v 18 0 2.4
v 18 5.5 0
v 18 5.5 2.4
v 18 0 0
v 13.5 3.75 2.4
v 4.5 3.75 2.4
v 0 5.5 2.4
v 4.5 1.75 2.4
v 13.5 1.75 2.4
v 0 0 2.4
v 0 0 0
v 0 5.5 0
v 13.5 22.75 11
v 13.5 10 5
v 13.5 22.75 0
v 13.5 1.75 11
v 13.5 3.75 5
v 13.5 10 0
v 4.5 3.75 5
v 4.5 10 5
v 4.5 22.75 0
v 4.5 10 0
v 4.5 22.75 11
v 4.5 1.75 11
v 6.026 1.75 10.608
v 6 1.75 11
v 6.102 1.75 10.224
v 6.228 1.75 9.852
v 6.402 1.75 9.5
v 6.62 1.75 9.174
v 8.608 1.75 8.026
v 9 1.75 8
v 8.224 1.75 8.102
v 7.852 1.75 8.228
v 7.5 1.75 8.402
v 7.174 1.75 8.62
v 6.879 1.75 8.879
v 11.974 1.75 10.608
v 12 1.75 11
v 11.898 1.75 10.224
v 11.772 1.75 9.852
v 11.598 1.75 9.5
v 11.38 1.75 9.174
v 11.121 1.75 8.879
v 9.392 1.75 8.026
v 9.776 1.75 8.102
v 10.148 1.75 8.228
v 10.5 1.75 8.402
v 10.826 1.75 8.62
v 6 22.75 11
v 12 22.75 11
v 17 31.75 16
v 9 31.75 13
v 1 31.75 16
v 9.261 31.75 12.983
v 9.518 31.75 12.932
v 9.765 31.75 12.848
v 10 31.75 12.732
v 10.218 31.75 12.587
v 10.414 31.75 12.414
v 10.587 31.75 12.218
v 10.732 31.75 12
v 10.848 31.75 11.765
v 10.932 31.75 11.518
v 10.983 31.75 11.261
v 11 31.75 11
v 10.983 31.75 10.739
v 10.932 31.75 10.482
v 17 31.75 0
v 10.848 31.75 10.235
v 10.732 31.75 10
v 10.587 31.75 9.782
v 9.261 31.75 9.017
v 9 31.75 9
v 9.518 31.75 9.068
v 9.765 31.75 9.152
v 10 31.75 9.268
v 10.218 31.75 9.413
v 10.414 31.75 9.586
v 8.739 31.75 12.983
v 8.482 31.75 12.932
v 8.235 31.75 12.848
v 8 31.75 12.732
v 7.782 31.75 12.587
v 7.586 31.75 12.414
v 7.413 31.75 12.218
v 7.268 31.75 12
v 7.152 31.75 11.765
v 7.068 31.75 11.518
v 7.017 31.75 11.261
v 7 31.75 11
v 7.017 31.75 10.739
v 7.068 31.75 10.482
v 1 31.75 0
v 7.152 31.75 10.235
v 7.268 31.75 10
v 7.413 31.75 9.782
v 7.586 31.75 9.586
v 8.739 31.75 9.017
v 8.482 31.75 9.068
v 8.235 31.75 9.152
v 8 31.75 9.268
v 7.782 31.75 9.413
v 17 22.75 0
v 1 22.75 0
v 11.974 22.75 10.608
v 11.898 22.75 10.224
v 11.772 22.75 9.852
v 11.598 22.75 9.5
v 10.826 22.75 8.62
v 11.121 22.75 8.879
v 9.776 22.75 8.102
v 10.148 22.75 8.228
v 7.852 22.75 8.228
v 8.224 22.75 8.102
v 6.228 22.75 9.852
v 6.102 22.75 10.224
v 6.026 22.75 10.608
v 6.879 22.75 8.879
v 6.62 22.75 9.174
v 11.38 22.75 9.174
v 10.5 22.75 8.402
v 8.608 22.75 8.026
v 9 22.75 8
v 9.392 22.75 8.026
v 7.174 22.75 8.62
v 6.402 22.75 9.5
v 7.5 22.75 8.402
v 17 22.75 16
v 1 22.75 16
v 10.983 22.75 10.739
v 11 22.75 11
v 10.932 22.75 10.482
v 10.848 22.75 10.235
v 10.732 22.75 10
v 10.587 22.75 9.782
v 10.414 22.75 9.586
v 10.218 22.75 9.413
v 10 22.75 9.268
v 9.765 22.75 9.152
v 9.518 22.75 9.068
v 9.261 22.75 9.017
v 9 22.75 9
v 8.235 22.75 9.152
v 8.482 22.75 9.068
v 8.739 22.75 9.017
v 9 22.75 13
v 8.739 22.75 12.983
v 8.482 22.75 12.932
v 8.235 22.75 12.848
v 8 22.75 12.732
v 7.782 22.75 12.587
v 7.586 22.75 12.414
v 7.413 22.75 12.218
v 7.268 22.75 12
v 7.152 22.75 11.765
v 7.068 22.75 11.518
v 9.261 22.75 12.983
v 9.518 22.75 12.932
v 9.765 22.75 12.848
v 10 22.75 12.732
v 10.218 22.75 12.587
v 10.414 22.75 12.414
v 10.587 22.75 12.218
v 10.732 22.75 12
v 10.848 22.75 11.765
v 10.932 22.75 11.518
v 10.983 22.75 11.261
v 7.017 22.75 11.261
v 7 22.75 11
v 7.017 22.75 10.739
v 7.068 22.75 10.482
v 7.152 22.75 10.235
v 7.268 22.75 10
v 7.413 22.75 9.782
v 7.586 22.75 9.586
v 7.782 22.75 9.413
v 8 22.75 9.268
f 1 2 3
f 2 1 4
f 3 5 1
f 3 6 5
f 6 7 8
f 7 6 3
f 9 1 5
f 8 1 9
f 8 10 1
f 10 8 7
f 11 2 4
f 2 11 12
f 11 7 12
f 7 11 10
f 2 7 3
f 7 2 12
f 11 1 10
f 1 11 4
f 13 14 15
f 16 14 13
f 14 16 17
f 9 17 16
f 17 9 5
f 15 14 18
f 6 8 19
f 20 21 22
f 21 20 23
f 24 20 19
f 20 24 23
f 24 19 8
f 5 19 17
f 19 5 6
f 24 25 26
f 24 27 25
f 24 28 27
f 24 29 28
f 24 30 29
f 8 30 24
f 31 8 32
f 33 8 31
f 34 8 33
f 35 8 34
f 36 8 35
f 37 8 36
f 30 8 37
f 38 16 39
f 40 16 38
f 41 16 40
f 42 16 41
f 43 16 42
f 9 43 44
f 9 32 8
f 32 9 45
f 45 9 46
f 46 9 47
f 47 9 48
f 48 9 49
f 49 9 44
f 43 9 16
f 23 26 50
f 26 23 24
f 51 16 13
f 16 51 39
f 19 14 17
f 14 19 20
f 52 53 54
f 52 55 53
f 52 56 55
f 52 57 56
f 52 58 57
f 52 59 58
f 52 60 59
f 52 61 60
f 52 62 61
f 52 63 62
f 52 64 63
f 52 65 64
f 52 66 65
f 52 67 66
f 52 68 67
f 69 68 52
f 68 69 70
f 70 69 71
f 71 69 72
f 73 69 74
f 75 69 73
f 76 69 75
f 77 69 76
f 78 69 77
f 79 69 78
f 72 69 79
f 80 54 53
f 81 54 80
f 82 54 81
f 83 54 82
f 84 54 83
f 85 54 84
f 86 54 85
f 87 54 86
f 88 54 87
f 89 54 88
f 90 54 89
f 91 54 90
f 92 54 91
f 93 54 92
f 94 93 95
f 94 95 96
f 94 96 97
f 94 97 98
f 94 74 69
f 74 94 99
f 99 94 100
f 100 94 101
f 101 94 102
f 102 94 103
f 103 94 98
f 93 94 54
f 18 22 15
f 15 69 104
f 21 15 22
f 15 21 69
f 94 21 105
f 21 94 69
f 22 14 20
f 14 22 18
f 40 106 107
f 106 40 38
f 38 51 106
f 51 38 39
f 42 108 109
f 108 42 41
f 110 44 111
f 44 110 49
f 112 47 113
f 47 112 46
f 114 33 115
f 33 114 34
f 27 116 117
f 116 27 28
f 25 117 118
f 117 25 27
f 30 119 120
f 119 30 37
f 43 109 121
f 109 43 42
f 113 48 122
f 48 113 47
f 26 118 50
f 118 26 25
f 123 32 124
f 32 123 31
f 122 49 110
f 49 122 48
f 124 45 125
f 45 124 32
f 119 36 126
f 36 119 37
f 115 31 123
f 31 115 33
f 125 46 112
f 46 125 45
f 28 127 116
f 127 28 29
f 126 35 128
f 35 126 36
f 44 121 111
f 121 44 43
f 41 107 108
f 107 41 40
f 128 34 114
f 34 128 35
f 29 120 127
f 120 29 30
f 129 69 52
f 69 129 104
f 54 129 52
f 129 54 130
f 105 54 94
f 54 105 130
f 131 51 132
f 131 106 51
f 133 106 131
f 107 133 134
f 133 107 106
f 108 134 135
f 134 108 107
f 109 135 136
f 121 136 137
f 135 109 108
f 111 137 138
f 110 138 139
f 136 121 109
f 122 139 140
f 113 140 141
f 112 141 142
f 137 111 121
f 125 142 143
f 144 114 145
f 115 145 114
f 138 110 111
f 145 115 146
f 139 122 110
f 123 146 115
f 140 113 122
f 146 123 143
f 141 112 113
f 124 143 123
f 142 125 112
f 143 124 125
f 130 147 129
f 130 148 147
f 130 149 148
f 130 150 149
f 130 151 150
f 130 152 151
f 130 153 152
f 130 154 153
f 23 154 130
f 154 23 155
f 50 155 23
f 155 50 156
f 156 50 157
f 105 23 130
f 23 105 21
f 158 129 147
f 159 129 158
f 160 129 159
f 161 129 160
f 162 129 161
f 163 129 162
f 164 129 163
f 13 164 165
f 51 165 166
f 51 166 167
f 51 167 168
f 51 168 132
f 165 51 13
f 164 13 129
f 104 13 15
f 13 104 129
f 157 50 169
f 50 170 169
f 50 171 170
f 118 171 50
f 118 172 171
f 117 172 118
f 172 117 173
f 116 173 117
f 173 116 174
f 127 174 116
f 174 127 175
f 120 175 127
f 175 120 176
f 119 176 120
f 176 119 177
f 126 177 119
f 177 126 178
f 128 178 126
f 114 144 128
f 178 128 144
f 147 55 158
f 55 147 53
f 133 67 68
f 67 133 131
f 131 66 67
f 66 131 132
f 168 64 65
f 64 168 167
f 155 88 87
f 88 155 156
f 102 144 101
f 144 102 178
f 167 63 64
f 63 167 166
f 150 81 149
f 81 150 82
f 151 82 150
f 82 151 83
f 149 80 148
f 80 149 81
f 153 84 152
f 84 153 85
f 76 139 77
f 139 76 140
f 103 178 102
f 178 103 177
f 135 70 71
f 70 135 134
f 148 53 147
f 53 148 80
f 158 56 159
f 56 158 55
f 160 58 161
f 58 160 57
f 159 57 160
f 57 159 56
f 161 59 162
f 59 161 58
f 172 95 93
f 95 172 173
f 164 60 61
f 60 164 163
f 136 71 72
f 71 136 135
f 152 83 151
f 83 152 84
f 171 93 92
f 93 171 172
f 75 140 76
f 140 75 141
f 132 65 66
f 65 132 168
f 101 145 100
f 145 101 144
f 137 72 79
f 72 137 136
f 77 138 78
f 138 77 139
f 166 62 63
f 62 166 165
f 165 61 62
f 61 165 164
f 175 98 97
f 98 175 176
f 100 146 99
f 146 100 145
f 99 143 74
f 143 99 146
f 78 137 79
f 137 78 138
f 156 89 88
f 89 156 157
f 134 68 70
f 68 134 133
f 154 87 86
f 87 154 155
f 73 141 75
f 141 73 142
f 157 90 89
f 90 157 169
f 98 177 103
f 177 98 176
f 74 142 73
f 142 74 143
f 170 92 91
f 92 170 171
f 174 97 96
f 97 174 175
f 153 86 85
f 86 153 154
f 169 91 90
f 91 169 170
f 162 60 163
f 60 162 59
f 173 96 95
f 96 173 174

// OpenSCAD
// Improved, curtain rail hook.

// Copyright (C) 2017 Embecosm Limited (www.embecosm.com)

// Contributor: Jeremy Bennett <jeremy.bennett@embecosm.com>

// This file is licensed under the Creative Commons Attribution-ShareAlike 3.0
// Unported License. To view a copy of this license, visit
// http://creativecommons.org/licenses/by-sa/3.0/ or send a letter to Creative
// Commons, PO Box 1866, Mountain View, CA 94042, USA.


// This is based on http://www.thingiverse.com/thing:408249, but designed to
// be configurable and a bit more forgiving to print.



module lug () {
     cube (size = [18, 5.5, 2.4], center = false);
     translate (v = [4.5, 1.75, 0])
	  cube (size = [9, 2, 6], center = false);
}


module bar () {
     difference () {
	  union () {
	       translate (v = [4.5, 1.75, 5])
		    cube (size = [9, 30, 6], center = false);
	       translate (v = [4.5, 10, 0])
		    cube (size = [9, 21.75, 6], center = false);
	  }
	  translate (v = [9, 0, 11])
	       rotate (a = [-90, 0, 0])
	            cylinder (r = 3, h = 40, $fn = 48, center = false);
     }
}


module block () {
     difference () {
	  translate (v = [1, 22.75, 0])
	       cube (size = [16, 9, 16], center = false);
	  translate (v = [9, 0, 11])
	       rotate (a = [-90, 0, 0])
	            cylinder (r = 2, h = 40, $fn = 48, center = false);
     }
}


module curtain_hook () {
     lug ();
     bar ();
     block ();
}


curtain_hook ();
